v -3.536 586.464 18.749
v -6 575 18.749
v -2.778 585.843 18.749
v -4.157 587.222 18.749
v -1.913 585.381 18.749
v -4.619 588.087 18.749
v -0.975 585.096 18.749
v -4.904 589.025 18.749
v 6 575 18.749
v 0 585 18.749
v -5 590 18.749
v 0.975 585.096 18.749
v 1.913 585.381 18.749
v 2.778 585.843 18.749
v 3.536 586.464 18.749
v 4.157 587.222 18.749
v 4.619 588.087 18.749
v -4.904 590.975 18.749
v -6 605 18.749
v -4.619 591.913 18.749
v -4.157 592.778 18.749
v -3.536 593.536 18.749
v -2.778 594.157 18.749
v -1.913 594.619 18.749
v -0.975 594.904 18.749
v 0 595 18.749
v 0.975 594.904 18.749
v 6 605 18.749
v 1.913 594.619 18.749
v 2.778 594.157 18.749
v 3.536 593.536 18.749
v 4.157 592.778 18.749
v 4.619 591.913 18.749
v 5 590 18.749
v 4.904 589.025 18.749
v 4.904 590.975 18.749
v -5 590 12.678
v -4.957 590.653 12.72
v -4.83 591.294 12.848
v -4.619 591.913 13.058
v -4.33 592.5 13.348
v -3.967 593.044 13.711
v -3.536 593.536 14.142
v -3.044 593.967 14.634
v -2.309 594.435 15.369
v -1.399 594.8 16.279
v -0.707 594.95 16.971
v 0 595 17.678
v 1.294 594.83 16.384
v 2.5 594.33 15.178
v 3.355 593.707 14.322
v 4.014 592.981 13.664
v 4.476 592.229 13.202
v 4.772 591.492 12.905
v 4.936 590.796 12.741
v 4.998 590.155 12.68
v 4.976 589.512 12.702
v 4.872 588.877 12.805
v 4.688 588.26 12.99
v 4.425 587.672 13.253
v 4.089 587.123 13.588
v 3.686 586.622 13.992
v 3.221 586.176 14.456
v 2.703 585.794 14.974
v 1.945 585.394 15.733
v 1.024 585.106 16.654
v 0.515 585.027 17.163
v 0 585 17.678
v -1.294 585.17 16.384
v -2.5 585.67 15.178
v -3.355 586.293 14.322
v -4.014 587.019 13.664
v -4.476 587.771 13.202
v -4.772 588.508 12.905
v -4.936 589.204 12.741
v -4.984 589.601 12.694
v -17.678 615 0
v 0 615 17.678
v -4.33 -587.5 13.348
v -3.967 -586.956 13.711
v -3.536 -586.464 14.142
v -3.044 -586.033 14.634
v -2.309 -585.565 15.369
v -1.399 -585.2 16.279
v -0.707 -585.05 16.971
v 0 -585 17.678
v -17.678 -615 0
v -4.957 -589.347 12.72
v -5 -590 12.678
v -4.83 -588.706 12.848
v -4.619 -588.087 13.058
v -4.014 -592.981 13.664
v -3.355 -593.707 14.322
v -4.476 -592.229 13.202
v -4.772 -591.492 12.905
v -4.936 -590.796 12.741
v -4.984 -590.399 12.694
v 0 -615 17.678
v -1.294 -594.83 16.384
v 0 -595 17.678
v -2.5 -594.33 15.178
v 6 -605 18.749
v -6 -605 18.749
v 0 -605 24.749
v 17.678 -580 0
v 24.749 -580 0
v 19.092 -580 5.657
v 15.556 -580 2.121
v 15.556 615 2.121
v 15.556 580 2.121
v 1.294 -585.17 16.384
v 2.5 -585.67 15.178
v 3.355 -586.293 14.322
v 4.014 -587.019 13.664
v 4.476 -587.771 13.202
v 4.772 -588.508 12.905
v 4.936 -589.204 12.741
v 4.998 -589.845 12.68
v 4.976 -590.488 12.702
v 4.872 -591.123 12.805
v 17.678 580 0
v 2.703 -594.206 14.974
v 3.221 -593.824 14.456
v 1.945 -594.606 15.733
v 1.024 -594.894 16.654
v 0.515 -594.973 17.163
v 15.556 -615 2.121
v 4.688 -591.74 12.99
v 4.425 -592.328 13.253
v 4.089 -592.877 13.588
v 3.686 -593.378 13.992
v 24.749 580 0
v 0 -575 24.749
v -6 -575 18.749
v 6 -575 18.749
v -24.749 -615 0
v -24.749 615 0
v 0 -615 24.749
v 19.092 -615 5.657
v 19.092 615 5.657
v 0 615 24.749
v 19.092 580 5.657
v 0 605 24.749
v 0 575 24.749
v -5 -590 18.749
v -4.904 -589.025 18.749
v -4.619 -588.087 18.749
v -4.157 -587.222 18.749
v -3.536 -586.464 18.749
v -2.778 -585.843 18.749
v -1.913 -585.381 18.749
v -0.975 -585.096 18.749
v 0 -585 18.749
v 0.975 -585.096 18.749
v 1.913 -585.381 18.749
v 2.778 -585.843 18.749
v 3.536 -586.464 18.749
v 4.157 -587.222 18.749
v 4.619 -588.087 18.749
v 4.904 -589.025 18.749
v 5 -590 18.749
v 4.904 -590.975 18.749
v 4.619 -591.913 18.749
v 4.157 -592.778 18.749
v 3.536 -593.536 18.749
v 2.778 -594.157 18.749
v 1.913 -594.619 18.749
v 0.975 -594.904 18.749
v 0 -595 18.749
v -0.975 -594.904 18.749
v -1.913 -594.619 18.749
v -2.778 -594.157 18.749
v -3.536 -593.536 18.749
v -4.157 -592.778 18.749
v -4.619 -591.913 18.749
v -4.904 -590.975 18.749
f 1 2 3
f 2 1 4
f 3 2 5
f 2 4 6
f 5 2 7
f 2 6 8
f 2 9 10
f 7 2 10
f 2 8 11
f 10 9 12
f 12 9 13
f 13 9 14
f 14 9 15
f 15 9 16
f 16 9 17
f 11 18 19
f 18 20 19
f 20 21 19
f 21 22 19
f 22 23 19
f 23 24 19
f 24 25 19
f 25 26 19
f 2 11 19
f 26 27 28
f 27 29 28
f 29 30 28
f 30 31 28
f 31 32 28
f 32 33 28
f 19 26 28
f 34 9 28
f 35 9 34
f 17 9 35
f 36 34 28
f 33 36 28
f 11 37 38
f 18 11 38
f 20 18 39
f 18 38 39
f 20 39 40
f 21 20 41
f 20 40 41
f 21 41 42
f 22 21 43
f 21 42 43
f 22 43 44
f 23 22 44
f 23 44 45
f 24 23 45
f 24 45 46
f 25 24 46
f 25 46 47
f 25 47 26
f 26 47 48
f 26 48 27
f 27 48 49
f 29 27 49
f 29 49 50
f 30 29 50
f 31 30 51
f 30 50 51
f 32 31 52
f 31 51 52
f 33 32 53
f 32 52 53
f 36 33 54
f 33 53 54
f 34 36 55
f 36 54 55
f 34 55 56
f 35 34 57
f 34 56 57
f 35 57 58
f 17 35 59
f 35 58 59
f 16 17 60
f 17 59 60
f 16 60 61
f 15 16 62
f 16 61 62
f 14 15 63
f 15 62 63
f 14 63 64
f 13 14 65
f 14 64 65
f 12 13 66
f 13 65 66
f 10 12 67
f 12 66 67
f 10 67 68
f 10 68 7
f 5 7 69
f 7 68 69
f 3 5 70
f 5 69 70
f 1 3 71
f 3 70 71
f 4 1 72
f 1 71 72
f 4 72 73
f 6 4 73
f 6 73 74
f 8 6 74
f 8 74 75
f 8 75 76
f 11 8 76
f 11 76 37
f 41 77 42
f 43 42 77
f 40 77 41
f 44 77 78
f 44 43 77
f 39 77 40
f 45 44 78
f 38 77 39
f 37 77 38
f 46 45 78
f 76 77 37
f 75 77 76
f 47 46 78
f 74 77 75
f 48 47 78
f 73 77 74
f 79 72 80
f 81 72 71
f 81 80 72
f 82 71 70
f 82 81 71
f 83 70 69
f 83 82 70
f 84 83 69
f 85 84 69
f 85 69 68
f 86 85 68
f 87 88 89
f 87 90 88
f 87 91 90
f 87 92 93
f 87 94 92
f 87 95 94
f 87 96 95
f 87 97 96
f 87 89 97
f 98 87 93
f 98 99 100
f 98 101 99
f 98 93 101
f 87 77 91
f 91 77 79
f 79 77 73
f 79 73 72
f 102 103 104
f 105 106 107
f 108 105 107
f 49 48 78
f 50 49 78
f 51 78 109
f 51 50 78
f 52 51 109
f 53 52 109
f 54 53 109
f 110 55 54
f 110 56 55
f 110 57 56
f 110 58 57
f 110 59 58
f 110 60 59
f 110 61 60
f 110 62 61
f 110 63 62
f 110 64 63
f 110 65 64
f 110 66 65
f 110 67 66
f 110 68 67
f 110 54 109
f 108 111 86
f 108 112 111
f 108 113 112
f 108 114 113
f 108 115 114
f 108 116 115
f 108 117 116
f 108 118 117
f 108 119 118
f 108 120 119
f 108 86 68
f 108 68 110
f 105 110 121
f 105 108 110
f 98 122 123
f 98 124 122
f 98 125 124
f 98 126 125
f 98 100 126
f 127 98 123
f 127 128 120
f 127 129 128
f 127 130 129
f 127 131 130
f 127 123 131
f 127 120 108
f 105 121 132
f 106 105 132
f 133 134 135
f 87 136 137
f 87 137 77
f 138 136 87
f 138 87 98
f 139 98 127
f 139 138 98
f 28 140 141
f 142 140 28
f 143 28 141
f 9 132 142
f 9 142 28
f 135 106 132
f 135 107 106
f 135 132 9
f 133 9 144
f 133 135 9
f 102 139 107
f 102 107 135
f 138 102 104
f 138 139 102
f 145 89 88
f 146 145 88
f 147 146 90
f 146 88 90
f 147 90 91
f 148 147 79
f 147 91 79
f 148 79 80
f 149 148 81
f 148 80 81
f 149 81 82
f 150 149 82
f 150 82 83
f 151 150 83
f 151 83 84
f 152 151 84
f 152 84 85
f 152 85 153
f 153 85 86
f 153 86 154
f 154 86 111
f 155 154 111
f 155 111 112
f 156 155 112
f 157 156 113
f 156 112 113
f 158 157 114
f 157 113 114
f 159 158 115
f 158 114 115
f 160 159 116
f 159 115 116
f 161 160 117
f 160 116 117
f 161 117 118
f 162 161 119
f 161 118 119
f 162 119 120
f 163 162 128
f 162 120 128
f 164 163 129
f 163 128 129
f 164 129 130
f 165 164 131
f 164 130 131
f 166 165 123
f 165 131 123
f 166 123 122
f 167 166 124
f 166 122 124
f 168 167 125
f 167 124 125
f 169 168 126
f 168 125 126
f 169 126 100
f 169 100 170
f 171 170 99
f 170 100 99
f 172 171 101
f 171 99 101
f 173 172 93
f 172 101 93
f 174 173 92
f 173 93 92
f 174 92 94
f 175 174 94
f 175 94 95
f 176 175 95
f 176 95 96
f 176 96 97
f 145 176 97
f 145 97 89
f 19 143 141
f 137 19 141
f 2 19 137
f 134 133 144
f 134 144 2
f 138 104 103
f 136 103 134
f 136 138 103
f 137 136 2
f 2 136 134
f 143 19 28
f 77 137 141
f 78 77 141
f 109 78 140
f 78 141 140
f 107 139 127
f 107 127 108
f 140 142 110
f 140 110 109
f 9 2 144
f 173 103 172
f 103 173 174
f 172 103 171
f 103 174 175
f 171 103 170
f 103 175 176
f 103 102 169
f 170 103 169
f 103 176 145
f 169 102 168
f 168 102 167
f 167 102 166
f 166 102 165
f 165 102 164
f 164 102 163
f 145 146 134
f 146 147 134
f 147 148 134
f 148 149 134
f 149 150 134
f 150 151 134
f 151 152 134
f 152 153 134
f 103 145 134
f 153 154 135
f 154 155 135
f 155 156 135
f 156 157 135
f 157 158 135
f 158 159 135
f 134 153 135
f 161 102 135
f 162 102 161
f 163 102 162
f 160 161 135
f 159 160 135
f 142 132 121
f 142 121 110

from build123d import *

# Parameters (mm, degrees)
F1_DEPTH = 615
F3_W     = 30
F3_H     = 6
F4_DEPTH = 54.7497373415
F6_D     = 10
F7_W     = 35
F7_H     = 8
F8_DEPTH = 25


with BuildPart() as f1:
    # F0 (on Front) → F1 (new body, symmetric)
    with BuildSketch(Plane.XZ):
        Polygon((17.6776695297, 0), (24.7487373415, 0), (0, 24.7487373415), (-24.7487373415, 0), (-17.6776695297, 0), (0, 17.6776695297), align=None)
    extrude(amount=F1_DEPTH, both=True)

    # F3 (on offset) → F4 (cut, through all)
    with BuildSketch(Plane.YZ.offset(30)):
        with Locations((590, 21.7487373415)):
            Rectangle(F3_W, F3_H)
        with Locations((-590, 21.7487373415)):
            Rectangle(F3_W, F3_H)
    extrude(amount=-F4_DEPTH, mode=Mode.SUBTRACT)

    # F6 (through all)
    with Locations(Plane.XY.offset(18.7487373415)):
        with Locations((0, -590), (0, 590)):
            Hole(F6_D / 2)

    # F7 (on face) → F8 (cut)
    with BuildSketch(Plane(origin=(12.3743686708, 0, 12.3743686708), x_dir=(0, 1, 0), z_dir=(0.7071067812, 0, 0.7071067812))):
        with Locations((-597.5, -13.5)):
            Rectangle(F7_W, F7_H)
        with Locations((597.5, -13.5)):
            Rectangle(F7_W, F7_H)
    extrude(amount=-F8_DEPTH, mode=Mode.SUBTRACT)


solid = f1.part
